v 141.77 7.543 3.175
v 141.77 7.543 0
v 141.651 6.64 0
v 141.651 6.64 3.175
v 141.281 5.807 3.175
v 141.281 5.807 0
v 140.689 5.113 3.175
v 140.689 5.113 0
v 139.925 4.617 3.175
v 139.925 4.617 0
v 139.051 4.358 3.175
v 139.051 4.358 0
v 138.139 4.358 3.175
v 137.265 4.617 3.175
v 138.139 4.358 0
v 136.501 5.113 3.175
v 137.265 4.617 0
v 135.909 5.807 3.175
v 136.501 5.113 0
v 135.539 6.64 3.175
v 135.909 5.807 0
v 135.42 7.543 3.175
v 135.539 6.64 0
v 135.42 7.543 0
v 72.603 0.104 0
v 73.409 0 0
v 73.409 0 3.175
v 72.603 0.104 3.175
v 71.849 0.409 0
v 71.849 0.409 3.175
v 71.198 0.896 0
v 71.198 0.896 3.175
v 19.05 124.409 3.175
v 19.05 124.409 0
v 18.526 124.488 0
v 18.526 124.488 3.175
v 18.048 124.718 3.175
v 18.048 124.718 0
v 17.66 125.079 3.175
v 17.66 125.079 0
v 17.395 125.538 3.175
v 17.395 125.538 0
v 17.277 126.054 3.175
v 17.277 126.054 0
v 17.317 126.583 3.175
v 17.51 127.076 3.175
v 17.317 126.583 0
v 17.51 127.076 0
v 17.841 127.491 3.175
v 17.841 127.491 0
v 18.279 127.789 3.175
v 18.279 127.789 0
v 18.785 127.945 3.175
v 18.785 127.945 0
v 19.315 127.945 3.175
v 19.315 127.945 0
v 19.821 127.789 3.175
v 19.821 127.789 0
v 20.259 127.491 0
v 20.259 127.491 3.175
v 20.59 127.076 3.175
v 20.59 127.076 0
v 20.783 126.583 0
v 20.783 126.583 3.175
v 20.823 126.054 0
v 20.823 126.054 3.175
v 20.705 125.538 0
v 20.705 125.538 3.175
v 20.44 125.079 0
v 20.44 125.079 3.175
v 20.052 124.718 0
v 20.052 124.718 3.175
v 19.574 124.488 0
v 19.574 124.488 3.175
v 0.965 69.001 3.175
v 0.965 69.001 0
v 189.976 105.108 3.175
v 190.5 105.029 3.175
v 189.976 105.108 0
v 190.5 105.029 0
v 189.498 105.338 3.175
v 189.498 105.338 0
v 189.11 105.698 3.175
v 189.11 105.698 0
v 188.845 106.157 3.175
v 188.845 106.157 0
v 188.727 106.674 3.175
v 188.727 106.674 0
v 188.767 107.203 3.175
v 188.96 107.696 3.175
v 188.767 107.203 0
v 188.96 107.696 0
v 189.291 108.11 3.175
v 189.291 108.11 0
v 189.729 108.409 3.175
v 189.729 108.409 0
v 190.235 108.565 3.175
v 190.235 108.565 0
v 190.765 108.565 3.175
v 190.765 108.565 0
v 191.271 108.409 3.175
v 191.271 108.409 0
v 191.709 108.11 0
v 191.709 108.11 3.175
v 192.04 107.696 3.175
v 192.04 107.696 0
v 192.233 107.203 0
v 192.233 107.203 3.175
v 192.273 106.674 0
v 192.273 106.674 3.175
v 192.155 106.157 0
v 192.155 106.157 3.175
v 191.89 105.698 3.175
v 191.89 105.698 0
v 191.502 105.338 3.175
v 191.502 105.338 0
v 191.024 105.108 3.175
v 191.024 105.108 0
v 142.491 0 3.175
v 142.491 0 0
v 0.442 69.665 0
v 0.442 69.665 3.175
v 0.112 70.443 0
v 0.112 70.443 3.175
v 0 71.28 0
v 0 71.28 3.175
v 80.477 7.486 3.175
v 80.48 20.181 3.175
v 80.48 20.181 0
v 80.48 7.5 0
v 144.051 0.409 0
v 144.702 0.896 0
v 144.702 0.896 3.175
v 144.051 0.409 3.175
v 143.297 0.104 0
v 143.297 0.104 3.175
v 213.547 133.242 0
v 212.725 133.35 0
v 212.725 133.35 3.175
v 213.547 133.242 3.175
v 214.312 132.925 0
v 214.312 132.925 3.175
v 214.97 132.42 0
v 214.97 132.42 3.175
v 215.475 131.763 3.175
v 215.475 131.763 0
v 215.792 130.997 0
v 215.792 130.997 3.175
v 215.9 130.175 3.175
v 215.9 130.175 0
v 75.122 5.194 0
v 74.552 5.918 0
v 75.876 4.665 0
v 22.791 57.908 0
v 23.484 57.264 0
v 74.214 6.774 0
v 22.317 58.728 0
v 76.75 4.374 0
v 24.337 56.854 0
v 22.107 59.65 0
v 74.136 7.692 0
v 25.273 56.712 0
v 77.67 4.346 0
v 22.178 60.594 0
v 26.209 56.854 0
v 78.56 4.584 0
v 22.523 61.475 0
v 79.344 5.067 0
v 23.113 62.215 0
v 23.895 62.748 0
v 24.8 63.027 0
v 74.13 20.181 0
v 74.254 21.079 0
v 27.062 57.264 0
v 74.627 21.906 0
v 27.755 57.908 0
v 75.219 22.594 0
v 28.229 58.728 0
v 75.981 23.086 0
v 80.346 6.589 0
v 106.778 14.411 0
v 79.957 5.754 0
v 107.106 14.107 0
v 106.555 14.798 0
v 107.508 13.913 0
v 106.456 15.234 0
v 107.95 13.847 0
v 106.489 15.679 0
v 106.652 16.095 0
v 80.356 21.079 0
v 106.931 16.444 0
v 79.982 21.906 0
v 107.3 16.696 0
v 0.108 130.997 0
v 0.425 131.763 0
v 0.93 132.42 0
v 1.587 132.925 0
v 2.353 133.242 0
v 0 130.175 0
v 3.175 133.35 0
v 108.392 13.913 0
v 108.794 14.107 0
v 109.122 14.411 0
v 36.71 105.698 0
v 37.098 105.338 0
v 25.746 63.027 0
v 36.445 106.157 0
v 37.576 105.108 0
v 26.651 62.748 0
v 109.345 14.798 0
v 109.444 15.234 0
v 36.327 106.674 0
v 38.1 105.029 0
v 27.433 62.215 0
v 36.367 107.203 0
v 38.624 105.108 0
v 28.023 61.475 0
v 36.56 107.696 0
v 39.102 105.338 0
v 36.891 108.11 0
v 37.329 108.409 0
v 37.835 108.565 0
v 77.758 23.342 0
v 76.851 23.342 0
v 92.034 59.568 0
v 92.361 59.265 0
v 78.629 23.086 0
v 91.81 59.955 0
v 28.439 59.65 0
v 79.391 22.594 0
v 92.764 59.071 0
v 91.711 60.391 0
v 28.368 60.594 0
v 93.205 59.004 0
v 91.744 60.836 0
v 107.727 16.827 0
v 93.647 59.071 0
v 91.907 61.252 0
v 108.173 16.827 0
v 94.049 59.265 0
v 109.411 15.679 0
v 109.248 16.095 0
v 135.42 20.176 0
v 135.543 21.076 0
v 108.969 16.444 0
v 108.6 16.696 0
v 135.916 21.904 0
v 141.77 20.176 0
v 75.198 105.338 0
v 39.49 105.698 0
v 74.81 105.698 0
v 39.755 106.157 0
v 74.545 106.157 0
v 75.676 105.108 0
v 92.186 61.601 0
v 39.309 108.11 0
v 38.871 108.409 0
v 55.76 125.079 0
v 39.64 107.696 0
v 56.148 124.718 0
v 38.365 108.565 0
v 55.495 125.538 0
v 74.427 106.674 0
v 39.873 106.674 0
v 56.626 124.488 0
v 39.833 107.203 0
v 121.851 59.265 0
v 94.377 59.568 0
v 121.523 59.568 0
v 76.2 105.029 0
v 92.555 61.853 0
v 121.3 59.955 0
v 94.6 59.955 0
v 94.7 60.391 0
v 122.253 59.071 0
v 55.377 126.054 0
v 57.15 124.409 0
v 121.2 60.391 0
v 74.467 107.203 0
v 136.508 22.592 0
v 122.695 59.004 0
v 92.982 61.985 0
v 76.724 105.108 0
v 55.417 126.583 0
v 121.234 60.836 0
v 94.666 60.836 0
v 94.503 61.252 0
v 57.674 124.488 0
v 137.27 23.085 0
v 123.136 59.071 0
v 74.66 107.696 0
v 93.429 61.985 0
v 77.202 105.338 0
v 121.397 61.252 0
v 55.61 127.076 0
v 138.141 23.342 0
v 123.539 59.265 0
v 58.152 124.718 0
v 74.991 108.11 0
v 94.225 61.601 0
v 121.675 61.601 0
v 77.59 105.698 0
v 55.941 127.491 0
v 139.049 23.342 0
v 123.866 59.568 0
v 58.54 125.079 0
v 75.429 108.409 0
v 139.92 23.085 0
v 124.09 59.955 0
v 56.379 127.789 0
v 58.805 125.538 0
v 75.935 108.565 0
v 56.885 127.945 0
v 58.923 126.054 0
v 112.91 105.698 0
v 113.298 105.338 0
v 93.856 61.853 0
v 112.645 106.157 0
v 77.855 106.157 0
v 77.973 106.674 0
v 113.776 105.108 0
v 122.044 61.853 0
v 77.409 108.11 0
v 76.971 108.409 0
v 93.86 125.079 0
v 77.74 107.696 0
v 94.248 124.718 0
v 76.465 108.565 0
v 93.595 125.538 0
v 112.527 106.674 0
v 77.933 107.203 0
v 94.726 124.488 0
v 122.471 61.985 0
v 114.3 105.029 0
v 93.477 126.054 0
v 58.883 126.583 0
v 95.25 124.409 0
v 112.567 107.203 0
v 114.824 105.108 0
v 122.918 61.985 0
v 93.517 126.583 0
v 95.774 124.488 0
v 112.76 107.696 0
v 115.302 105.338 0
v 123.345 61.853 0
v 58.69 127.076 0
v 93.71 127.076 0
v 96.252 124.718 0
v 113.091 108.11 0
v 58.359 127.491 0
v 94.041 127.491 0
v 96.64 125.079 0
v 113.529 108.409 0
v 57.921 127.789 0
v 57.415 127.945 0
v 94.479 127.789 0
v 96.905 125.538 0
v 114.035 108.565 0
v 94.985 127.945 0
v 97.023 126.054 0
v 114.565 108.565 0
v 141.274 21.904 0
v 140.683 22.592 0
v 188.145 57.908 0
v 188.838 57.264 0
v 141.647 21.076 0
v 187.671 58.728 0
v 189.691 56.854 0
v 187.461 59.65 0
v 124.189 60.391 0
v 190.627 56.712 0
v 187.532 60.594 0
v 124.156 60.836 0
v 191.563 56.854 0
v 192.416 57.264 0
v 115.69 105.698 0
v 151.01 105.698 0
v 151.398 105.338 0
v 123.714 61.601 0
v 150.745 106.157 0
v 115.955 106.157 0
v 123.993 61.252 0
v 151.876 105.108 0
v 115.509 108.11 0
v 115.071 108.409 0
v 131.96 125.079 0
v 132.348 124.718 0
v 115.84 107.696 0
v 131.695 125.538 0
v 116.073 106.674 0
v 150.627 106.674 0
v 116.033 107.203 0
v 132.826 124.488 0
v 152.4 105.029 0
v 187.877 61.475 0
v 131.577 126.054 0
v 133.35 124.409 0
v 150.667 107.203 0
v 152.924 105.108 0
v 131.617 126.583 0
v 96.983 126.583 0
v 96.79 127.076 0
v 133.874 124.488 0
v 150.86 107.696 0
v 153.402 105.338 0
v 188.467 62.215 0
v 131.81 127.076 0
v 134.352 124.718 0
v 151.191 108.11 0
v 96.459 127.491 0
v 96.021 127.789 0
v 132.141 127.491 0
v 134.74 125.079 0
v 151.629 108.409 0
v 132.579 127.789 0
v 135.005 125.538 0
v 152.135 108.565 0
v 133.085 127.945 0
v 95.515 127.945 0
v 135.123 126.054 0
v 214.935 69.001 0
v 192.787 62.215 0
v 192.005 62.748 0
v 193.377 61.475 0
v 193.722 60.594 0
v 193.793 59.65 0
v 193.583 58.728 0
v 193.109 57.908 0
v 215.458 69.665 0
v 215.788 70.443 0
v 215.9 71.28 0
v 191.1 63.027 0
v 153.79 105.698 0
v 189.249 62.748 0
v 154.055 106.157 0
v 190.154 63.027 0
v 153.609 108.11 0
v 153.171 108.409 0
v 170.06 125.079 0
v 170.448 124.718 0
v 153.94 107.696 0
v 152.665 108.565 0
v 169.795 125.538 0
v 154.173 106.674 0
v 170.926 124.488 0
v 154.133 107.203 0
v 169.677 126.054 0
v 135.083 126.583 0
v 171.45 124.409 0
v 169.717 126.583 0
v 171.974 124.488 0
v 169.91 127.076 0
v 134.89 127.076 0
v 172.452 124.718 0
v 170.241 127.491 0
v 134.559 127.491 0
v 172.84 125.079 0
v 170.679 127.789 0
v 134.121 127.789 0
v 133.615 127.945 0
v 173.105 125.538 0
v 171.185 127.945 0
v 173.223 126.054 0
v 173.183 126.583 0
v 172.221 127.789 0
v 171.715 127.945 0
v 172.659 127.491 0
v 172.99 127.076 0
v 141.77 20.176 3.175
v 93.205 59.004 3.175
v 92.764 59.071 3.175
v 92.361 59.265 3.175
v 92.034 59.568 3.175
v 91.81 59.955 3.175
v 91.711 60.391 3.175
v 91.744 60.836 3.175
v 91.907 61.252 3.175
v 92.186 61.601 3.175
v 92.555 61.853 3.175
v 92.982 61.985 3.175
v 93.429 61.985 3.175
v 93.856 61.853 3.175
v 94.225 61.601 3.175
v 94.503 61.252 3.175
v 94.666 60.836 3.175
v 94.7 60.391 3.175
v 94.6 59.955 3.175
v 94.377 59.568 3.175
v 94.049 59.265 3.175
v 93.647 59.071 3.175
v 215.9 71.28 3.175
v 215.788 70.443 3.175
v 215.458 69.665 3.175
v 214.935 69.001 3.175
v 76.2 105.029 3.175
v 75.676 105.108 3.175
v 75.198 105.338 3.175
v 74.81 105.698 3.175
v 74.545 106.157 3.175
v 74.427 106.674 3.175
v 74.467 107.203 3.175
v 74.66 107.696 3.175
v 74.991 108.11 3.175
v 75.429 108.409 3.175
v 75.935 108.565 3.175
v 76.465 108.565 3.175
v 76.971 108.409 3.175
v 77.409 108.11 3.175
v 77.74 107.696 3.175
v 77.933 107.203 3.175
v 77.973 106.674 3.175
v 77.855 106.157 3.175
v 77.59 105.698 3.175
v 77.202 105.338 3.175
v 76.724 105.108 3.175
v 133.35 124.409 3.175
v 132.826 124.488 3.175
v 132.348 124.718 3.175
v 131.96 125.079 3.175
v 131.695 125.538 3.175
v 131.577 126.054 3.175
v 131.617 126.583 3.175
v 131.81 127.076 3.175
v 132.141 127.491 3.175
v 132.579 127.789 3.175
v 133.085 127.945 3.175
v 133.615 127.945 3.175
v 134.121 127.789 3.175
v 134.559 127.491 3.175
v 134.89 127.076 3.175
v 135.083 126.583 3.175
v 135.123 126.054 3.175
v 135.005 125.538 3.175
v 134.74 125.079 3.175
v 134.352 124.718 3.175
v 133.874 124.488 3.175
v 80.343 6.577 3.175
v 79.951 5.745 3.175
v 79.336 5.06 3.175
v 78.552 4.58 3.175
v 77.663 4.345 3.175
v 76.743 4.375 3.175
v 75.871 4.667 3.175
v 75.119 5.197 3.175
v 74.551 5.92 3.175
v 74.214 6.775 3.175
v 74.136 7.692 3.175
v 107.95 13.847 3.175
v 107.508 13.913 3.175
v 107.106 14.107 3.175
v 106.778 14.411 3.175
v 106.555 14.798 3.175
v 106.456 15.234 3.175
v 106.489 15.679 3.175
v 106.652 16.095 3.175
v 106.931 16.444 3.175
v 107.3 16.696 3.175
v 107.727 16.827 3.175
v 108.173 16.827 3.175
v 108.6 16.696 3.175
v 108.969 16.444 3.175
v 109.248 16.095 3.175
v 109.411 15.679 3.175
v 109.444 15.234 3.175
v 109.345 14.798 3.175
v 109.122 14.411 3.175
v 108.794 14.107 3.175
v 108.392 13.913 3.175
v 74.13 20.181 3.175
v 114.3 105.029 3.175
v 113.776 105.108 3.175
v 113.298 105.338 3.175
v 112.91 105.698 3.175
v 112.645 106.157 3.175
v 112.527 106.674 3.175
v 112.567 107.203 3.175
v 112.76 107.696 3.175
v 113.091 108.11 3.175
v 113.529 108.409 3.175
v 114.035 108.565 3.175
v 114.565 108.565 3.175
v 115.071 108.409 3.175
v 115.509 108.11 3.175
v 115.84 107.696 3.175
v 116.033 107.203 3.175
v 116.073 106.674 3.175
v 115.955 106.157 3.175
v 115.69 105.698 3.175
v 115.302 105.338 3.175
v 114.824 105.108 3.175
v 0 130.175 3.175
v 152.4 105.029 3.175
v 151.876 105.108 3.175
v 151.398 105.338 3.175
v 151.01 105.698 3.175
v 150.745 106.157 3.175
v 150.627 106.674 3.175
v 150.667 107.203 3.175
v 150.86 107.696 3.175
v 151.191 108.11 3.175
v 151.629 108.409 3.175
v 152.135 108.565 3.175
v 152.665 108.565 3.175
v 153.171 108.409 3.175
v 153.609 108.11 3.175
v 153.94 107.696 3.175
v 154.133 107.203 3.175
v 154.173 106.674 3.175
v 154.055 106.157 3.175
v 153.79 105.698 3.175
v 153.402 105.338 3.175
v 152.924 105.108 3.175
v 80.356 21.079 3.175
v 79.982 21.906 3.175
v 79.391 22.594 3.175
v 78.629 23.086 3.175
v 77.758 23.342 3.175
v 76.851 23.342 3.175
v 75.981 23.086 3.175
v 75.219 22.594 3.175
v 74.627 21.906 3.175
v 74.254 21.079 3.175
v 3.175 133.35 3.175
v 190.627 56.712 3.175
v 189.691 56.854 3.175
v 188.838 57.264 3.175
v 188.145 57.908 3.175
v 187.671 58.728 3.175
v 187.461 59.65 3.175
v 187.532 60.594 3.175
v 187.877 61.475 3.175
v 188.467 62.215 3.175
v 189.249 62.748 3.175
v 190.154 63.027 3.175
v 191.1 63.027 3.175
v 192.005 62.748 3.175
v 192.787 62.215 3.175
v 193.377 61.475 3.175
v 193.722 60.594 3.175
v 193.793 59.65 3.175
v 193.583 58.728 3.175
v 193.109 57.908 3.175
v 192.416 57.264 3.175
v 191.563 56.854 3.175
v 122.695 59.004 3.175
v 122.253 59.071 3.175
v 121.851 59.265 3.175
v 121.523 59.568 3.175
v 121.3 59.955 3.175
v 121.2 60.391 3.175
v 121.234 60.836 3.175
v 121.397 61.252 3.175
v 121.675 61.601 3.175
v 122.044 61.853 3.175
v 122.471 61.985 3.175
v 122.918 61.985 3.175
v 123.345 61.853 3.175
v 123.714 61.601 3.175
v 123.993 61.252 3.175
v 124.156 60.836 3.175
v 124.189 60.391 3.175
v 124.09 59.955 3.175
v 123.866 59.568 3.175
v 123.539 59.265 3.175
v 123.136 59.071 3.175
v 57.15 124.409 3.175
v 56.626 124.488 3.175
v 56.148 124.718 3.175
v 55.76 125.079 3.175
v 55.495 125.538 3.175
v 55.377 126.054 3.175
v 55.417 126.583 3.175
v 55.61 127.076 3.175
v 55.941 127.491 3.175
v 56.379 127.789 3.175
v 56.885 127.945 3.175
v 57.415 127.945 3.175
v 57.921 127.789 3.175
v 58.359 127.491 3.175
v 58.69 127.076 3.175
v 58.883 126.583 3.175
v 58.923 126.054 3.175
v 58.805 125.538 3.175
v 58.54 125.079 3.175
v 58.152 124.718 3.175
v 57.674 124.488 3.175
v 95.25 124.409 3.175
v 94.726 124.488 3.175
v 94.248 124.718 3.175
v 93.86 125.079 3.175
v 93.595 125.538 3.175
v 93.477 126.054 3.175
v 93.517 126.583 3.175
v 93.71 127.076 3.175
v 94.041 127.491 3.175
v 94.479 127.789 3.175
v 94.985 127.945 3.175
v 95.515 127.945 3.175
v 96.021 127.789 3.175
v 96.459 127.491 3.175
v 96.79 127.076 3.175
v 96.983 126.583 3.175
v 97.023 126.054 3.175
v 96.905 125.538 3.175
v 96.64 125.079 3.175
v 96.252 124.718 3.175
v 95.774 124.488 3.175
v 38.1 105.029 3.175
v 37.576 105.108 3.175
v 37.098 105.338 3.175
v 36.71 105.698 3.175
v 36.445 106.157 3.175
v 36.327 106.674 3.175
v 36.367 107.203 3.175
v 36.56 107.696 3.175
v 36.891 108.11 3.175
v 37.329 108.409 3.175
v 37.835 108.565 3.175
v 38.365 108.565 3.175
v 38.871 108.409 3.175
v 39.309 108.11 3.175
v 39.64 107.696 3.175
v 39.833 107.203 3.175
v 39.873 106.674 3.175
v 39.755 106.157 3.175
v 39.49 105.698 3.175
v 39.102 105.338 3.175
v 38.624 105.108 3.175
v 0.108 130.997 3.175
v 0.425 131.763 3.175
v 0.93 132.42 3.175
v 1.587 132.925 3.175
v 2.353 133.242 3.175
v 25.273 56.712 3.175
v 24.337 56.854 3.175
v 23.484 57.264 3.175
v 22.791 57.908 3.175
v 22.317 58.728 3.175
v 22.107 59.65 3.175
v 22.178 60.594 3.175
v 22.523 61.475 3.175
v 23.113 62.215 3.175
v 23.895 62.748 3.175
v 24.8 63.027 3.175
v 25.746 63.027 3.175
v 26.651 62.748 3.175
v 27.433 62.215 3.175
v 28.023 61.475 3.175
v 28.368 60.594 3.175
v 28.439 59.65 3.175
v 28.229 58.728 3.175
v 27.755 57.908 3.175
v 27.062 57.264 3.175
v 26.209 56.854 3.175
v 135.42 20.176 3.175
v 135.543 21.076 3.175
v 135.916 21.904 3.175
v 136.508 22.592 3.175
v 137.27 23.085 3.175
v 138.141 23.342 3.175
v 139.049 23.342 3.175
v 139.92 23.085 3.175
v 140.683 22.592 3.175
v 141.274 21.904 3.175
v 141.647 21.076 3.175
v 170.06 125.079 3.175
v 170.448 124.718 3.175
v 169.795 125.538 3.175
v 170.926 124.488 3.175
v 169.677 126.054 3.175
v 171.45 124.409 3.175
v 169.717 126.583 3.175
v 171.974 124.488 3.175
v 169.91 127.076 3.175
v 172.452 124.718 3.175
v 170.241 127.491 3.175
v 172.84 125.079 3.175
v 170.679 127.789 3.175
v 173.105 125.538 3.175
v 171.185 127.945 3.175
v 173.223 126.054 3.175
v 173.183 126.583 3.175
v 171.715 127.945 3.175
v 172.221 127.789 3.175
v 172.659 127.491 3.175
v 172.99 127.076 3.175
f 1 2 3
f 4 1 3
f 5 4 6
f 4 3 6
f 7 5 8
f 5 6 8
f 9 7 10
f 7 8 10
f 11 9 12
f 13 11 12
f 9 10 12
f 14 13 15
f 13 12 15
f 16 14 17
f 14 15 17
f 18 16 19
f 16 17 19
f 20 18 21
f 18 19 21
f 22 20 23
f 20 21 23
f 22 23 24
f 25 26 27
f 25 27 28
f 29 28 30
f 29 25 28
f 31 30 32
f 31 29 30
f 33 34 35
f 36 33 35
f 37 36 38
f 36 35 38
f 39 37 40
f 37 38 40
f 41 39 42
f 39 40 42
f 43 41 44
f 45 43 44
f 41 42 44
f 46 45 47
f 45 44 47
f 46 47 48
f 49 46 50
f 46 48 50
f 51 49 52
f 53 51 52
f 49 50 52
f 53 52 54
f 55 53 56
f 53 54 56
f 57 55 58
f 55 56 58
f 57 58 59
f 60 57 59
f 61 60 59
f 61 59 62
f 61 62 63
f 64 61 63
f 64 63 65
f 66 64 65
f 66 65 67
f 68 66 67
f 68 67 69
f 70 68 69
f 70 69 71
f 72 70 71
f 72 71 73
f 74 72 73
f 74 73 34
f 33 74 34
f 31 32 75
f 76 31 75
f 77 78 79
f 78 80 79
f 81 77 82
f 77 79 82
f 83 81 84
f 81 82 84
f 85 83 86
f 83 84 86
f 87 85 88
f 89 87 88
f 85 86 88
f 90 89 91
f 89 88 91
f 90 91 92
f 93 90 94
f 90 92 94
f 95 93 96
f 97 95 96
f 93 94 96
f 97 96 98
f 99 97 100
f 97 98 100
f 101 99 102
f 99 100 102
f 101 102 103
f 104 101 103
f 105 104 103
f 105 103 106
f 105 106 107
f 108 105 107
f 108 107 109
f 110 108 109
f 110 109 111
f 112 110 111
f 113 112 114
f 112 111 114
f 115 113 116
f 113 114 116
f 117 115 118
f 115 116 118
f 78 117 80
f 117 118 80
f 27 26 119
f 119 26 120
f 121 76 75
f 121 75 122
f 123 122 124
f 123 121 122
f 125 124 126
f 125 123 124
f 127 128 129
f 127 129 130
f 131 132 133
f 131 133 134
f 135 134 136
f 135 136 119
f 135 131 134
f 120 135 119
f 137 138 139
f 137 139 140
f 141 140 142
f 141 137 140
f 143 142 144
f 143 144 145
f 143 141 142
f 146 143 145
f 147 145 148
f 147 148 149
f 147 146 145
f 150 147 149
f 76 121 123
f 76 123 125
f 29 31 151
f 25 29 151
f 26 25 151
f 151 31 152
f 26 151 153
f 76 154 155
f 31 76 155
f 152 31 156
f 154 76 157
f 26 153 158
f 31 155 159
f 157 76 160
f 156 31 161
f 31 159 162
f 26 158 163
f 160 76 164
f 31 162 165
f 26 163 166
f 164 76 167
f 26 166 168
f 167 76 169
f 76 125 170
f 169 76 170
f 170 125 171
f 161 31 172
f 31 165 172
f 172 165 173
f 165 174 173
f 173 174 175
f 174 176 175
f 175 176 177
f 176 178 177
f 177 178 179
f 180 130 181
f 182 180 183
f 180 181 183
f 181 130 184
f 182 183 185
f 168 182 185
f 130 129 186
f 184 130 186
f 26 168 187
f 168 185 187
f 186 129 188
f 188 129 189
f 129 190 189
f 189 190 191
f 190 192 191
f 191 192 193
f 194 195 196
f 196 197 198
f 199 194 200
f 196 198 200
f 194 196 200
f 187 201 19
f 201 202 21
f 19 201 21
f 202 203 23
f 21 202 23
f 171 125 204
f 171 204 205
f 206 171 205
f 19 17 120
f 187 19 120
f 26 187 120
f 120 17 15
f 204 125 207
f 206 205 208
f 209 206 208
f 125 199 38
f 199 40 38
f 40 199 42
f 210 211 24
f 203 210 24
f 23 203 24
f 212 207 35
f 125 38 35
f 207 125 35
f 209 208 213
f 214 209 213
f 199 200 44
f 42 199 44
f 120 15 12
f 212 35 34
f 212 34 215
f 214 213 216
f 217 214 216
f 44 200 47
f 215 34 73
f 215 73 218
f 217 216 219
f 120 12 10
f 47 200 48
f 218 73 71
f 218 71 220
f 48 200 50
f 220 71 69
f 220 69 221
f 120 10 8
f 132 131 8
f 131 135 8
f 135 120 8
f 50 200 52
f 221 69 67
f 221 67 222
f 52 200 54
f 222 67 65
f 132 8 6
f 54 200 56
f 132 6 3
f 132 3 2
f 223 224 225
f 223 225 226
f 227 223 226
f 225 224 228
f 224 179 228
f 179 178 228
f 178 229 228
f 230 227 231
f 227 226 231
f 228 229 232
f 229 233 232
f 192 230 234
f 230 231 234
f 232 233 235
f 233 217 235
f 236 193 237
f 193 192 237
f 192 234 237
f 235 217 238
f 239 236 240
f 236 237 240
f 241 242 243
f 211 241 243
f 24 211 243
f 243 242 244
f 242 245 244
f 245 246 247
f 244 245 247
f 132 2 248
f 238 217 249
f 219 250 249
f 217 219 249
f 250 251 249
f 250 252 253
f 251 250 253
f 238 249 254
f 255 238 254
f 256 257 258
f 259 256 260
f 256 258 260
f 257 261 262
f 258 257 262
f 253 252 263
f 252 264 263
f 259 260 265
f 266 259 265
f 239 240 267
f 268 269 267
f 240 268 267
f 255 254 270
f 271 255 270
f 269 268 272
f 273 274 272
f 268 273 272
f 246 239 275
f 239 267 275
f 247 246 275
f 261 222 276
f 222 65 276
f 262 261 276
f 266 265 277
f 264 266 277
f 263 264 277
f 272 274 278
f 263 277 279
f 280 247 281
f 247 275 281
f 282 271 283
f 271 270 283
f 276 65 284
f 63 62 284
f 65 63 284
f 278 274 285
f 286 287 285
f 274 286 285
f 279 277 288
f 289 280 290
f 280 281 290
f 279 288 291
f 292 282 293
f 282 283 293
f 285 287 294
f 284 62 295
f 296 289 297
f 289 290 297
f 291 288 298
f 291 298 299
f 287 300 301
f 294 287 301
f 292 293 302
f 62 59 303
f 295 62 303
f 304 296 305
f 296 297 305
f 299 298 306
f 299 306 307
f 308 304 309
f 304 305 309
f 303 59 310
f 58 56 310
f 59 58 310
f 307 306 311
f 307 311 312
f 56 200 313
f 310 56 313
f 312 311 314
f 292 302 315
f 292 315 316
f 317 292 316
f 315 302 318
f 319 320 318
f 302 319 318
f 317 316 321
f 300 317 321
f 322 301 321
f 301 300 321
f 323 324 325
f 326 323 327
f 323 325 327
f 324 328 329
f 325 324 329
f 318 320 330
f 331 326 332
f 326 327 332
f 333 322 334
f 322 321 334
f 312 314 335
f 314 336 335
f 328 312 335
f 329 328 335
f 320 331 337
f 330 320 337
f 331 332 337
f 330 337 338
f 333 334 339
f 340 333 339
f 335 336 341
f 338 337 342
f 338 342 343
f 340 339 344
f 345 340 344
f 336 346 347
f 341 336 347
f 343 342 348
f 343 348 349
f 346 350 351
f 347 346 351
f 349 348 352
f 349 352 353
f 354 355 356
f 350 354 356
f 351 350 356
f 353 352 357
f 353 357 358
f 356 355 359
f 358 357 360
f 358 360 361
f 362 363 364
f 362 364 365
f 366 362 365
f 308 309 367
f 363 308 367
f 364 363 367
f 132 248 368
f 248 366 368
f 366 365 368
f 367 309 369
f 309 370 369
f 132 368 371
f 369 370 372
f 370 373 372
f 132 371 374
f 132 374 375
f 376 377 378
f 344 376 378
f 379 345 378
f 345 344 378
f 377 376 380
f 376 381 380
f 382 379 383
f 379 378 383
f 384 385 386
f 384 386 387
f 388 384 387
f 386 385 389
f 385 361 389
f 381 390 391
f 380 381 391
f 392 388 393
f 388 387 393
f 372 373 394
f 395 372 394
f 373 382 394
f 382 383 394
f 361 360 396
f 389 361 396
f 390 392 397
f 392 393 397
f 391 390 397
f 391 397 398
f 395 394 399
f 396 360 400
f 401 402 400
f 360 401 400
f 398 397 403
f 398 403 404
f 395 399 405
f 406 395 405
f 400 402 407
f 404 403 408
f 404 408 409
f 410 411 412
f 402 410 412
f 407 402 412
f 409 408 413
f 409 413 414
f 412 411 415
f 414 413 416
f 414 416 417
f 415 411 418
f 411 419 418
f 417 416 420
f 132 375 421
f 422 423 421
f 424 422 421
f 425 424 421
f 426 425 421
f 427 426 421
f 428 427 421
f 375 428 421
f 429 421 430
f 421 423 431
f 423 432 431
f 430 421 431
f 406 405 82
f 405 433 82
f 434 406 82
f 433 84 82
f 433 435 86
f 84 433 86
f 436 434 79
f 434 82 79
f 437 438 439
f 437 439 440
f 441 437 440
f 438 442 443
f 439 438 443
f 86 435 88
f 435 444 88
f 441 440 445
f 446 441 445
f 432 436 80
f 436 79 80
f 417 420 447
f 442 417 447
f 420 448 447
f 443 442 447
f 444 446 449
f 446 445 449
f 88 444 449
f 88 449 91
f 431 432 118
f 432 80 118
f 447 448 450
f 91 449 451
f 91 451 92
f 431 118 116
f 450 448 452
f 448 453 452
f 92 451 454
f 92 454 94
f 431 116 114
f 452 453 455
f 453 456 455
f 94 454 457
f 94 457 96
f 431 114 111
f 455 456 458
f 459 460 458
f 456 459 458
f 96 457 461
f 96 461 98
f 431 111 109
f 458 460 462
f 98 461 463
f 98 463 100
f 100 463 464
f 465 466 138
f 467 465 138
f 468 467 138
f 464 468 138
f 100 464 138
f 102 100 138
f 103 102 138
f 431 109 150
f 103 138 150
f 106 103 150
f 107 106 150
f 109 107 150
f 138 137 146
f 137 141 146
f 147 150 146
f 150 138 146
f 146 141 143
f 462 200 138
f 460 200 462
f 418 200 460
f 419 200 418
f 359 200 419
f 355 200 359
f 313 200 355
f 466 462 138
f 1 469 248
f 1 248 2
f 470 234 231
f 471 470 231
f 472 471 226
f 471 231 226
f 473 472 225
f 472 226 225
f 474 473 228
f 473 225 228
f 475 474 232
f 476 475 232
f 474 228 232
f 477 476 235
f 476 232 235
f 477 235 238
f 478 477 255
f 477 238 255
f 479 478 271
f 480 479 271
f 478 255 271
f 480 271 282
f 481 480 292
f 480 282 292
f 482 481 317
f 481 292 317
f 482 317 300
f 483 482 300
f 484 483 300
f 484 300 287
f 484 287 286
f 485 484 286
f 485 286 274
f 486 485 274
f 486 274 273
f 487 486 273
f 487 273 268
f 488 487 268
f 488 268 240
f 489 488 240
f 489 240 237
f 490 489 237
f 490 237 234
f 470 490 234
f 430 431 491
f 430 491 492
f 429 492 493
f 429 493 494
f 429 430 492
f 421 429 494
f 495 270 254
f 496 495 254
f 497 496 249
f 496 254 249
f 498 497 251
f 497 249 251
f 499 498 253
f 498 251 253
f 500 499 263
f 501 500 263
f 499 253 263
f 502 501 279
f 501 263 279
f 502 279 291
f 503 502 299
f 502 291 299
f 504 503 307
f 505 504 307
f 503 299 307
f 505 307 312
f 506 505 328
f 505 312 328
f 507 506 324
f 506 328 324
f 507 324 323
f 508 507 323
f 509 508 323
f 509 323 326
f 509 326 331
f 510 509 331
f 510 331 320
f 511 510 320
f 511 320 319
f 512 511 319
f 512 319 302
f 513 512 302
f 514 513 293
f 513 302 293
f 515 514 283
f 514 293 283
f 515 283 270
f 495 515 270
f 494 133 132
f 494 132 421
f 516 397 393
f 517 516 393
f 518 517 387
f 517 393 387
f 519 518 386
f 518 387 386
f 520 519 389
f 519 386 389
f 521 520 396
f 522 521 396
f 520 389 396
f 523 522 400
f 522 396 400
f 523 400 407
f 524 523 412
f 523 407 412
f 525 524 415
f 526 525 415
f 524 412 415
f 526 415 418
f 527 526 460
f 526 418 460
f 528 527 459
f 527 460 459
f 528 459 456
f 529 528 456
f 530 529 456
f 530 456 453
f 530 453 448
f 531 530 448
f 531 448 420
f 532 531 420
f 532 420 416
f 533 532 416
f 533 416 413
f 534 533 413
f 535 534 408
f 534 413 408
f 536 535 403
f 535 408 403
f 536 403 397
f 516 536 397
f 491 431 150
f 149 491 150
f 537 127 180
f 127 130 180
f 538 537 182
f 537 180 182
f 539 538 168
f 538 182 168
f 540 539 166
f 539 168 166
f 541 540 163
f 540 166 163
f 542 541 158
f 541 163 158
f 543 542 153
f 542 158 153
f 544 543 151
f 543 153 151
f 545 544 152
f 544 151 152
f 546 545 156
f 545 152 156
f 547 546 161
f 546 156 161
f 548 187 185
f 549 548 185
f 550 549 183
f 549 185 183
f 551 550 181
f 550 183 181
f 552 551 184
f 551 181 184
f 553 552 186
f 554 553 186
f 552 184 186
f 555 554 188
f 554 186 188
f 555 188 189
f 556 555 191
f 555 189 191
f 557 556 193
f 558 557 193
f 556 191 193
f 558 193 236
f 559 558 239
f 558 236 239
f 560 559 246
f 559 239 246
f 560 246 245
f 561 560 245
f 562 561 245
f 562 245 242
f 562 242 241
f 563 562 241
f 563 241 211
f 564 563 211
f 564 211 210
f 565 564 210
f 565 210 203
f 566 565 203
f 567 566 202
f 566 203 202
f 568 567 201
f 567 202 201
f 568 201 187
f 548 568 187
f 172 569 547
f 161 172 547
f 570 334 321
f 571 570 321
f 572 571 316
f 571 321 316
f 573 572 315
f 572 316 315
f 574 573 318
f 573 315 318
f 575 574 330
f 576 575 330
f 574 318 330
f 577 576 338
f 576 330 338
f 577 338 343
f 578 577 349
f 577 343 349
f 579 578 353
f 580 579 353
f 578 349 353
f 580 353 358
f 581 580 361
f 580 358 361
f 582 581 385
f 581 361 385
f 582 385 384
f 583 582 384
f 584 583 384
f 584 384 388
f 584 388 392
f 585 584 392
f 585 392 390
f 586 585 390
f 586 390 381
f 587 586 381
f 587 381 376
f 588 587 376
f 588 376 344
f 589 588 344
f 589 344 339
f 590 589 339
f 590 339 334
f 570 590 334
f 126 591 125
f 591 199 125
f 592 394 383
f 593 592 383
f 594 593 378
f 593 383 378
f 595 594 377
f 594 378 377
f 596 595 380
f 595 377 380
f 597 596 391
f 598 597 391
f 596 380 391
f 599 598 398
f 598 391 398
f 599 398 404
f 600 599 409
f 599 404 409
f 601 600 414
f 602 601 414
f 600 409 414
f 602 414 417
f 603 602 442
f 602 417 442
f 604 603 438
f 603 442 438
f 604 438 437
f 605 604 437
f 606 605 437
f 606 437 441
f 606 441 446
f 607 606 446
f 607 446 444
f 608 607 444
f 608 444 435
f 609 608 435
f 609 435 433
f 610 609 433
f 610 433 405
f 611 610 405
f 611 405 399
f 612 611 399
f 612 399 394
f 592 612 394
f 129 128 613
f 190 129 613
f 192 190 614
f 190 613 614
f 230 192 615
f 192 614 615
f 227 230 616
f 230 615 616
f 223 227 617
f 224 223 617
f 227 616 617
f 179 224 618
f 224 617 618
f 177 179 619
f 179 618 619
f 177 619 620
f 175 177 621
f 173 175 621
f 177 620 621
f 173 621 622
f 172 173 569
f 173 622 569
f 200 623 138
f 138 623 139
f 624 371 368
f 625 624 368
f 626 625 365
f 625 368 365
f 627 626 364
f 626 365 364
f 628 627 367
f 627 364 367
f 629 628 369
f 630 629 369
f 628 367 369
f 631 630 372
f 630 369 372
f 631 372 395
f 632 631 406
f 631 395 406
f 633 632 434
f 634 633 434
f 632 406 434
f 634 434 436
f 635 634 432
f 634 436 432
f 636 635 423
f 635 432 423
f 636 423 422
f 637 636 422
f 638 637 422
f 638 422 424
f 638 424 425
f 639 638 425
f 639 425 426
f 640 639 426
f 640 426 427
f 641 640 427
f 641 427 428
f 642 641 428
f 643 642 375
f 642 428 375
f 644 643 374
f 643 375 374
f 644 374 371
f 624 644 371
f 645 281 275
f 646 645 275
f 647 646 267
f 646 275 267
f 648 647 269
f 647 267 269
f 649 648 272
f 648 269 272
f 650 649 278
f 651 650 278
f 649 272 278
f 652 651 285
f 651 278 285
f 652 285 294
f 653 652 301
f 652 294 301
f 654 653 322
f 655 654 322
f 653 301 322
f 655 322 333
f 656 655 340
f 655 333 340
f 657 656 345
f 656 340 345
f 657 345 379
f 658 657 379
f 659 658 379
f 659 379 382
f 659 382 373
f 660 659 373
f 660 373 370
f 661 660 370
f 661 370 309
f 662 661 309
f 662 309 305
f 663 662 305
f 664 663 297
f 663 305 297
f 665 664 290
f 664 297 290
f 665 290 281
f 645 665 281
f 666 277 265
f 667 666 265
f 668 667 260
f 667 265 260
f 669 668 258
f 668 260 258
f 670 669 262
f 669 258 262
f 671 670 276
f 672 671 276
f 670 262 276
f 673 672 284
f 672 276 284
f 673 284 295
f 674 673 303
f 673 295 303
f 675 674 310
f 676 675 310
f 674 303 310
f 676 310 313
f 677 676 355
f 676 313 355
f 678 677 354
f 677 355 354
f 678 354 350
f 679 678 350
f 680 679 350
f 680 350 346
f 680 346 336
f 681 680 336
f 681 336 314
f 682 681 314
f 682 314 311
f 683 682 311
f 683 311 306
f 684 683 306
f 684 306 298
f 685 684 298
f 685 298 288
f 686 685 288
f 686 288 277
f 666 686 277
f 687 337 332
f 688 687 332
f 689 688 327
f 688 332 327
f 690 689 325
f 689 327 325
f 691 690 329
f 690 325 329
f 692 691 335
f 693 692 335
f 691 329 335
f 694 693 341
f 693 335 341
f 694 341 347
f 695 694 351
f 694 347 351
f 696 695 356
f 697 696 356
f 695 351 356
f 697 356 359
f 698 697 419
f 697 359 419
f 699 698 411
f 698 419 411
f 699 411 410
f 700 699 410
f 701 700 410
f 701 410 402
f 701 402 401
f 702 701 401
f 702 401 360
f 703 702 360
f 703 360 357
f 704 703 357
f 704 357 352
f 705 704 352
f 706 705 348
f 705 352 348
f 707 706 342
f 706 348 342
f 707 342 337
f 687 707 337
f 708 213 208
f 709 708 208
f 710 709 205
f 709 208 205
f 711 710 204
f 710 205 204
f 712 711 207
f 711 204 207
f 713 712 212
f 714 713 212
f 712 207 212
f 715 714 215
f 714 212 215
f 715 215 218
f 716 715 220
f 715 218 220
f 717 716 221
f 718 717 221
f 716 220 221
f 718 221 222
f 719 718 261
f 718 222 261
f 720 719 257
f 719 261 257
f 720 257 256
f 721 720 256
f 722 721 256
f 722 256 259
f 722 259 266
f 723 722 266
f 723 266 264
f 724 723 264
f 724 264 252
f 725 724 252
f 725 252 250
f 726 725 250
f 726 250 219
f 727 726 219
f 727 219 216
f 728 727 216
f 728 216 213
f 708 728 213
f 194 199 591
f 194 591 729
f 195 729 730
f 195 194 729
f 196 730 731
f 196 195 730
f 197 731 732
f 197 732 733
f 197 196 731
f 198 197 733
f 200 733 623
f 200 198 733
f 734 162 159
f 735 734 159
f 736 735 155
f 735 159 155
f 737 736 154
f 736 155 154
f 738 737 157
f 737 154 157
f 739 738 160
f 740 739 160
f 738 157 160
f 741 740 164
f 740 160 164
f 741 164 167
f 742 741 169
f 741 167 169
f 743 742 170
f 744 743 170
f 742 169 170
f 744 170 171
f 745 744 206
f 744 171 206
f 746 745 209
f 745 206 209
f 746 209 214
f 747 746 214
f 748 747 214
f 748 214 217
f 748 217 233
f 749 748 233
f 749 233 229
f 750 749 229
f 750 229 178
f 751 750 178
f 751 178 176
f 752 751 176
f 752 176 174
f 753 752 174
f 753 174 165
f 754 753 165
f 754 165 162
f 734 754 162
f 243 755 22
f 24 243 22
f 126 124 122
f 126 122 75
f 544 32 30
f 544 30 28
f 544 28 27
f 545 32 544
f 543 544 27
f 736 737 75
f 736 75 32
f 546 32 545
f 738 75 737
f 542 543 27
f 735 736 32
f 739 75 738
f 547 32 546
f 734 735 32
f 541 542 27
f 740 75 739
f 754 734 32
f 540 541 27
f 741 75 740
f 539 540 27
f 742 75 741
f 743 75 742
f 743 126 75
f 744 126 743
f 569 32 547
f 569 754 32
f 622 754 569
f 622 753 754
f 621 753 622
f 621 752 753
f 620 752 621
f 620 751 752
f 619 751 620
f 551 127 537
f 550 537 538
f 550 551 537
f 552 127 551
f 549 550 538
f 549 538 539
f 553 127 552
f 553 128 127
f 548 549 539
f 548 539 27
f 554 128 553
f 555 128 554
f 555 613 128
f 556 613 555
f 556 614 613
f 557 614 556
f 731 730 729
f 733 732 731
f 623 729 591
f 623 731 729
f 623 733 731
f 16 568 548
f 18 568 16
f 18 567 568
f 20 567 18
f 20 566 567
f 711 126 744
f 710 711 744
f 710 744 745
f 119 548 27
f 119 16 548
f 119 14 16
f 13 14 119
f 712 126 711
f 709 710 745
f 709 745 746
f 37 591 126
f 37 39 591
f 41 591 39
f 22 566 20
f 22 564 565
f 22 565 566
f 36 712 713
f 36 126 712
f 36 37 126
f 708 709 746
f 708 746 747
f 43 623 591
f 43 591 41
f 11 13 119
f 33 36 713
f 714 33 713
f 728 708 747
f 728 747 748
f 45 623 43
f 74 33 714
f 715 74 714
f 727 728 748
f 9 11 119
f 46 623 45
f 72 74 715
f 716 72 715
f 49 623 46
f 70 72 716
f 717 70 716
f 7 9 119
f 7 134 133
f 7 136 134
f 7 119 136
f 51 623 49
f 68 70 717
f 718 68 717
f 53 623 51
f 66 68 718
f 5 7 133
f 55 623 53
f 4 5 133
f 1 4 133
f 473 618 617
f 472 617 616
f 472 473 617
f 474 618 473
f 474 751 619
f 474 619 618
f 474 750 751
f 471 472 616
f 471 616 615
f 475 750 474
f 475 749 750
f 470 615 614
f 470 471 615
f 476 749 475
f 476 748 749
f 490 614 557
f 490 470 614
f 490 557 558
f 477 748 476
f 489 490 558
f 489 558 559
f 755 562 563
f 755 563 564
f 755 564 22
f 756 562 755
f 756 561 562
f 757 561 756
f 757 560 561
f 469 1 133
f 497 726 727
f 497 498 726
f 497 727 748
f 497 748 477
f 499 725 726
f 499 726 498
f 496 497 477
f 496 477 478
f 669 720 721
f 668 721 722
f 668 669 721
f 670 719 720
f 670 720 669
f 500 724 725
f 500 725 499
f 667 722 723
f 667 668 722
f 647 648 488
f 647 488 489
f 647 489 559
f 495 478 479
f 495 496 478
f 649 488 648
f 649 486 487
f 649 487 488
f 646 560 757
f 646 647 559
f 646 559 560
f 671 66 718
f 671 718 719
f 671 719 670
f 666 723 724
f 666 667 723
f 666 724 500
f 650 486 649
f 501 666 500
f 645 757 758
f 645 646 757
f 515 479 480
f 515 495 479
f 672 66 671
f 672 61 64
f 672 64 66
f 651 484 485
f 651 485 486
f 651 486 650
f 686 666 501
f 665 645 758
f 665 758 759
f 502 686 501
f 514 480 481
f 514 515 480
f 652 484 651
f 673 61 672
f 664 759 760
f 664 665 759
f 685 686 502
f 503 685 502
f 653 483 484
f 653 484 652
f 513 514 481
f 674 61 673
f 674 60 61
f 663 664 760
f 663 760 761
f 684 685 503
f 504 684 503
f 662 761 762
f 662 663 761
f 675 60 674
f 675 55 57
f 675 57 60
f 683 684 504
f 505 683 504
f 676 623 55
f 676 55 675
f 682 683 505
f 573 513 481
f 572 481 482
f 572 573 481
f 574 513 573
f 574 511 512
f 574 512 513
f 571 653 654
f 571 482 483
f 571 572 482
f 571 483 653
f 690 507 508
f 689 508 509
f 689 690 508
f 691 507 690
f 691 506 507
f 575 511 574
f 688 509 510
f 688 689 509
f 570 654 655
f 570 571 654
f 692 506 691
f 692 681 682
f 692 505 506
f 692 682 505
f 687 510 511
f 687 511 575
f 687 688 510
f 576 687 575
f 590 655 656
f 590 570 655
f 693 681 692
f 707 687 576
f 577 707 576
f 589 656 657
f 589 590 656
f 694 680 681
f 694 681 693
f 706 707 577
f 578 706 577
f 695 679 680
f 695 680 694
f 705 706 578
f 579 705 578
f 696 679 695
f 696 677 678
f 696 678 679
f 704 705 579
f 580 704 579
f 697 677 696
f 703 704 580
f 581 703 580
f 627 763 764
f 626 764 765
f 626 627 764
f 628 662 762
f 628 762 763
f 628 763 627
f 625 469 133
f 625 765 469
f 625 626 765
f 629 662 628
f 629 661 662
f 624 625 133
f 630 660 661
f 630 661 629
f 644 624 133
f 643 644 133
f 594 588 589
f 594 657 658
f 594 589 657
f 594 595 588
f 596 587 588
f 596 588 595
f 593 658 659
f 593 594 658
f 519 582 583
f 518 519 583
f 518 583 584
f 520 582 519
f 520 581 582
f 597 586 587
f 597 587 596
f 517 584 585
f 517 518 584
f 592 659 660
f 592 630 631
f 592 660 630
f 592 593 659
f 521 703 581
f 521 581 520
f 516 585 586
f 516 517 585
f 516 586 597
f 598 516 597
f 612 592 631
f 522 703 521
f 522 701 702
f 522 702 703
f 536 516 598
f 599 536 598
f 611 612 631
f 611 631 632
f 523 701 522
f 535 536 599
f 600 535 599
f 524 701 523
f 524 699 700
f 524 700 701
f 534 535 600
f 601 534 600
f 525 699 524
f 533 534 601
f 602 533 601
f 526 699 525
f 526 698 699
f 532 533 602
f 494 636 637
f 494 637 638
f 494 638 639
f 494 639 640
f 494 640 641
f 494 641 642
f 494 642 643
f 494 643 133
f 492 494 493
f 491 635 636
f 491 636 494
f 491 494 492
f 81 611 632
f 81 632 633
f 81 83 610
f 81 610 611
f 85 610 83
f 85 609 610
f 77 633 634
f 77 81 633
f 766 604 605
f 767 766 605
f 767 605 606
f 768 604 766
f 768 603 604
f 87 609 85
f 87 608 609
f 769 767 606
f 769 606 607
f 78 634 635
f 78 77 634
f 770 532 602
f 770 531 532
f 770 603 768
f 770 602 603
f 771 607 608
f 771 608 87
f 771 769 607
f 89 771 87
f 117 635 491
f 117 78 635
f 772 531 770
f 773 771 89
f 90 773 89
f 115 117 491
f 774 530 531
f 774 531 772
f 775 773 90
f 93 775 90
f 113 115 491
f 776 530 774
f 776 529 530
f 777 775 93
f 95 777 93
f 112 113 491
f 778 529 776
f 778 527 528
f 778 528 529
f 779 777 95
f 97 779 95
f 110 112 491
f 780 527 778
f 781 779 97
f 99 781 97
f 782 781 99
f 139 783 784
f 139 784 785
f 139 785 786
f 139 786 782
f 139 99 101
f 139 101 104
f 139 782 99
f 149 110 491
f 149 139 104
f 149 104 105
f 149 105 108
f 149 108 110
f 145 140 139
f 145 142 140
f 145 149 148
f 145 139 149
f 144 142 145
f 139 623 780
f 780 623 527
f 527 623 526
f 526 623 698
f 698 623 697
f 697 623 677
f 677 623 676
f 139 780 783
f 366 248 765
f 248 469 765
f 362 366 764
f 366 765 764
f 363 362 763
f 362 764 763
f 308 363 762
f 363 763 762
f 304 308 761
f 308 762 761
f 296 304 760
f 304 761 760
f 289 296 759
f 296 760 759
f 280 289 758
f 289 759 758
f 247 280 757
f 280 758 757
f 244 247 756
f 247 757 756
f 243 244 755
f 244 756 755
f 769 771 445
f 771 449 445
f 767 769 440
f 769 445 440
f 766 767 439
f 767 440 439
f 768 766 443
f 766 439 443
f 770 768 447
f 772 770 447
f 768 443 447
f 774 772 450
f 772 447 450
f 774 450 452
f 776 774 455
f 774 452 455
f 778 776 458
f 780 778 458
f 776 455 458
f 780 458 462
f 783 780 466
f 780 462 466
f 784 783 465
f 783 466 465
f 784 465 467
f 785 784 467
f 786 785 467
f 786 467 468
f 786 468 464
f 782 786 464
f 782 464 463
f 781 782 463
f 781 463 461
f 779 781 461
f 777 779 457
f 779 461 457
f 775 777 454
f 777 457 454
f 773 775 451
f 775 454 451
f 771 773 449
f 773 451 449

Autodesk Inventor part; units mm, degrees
ref_plane "YZ Plane" through (0, 0, 0) normal (1, 0, 0) x (0, 1, 0)
ref_plane "XZ Plane" through (0, 0, 0) normal (0, 1, 0) x (-1, 0, 0)
ref_plane "XY Plane" through (0, 0, 0) normal (0, 0, 1) x (1, 0, 0)
sketch "Sketch1" plane through (0, 0, 0) normal (0, 0, 1) x (1, 0, 0)
  line L0 (0, 0) -> (215.9, 0)
  line L1 (215.9, 0) -> (215.9, 152.4)
  line L2 (215.9, 152.4) -> (0, 152.4)
  line L3 (0, 152.4) -> (0, 0)
  dimension "d0" = 215.9
  dimension "d1" = 152.4
extrude "Extrusion1" add sketch "Sketch1" along normal blind 3.175
sketch "Sketch2" plane through (0, 0, 3.175) normal (0, 0, 1) x (1, 0, 0)
  line L0 (215.9, 152.4) -> (0, 152.4) construction
  line L1 (107.95, 152.4) -> (107.95, 0) construction
  line L2 (0, 0) -> (215.9, 0) projected
  point P0 (25.273, 59.8875)
  point P1 (77.3049, 7.5)
  point P2 (190.627, 59.8875)
  point P3 (138.5951, 7.5)
  dimension "d5" = 30.6451
  dimension "d7" = 82.677
  dimension "d9" = 52.3875
  dimension "d10" = 7.5
hole "Hole1" at (25.273, 59.8875, 3.175) at (77.3049, 7.5, 3.175) at (190.627, 59.8875, 3.175) at (138.5951, 7.5, 3.175) direction (0, 0, -1) diameter 6.35 end through all
sketch "Sketch3" plane through (0, 0, 3.175) normal (0, 0, 1) x (1, 0, 0)
  line L0 (215.9, 152.4) -> (0, 152.4) projected
  line L1 (107.95, 152.4) -> (107.95, 0)
  line L2 (0, 0) -> (215.9, 0) projected
  line L3 (21.4376, 59.8875) -> (76.2, 7.5) construction
  line L4 (0, 152.4) -> (0, 0) projected
  line L5 (0, 130.175) -> (0, 78.2462)
  line L6 (3.175, 133.35) -> (107.95, 133.35)
  line L7 (0, 133.35) -> (0, 125.3708)
  line L8 (194.4624, 59.8875) -> (139.7, 7.5) construction
  line L9 (215.9, 152.4) -> (215.9, 78.2462)
  line L10 (215.9, 133.35) -> (215.9, 76.9596)
  line L11 (212.725, 133.35) -> (107.95, 133.35)
  line L12 (215.9, 130.175) -> (215.9, 125.3708)
  line L13 (75.9713, 0) -> (107.95, 0)
  line L14 (139.9287, 0) -> (107.95, 0)
  line L15 (215.9, 0) -> (215.9, 152.4) projected
  line L16 (107.95, 56.0437) -> (190.627, 56.0437) construction
  line L17 (0, 0) -> (215.9, 0) projected
  line L18 (143.7779, 0) -> (215.9, 69.9366)
  line L19 (72.1221, 0) -> (0, 69.9366)
  line L20 (0, 152.4) -> (0, 0) projected
  line L21 (72.1221, 0) -> (107.95, 0)
  line L22 (3.175, 133.35) -> (0, 133.35)
  line L23 (212.725, 133.35) -> (215.9, 133.35)
  point P0 (74.6275, 0)
  point P1 (0, 76.9596)
  point P2 (77.9849, 0)
  dimension "d20" = 19.05
  dimension "d36" = 135.881
  dimension "d37" = 135.881
  dimension "d41" = 35.8279
sketch "Sketch4" plane through (0, 0, 3.175) normal (0, 0, 1) x (1, 0, 0)
  arc A0 (80.4798, 20.1806) -> (74.13, 20.1806) centre (77.3049, 20.2) ccw
  circle A1 centre (77.3049, 7.5) radius 3.175 projected
  circle A2 centre (77.3049, 7.5) radius 3.175 projected
  line L0 (3.175, 133.35) -> (212.725, 133.35) projected
  line L1 (107.95, 133.35) -> (107.95, 0) construction
  line L2 (0, 0) -> (215.9, 0) projected
  arc A3 (141.77, 20.176) -> (135.4202, 20.176) centre (138.5951, 20.2) ccw
  arc A4 (74.1357, 7.5165) -> (80.474, 7.4806) centre (77.3049, 7.5) ccw
  circle A5 centre (138.5951, 7.5) radius 3.175 projected
  arc A6 (135.4202, 7.5433) -> (141.77, 7.5433) centre (138.5951, 7.5) ccw
  line L3 (141.77, 20.176) -> (141.77, 7.476)
  circle A7 centre (138.5951, 7.5) radius 3.175 projected
  line L4 (141.77, 20.176) -> (154.47, 20.176) construction
  line L5 (135.4202, 20.176) -> (135.4202, 7.476)
  line L6 (135.4202, 20.176) -> (148.1202, 20.176) construction
  line L7 (80.4798, 20.1806) -> (80.4798, 7.4806)
  line L8 (80.4798, 20.1806) -> (93.1798, 20.1806) construction
  line L9 (74.13, 20.1806) -> (74.1358, 7.4806)
  line L10 (74.13, 20.1806) -> (86.83, 20.1806) construction
  line L11 (74.13, 20.1806) -> (80.4798, 20.1806)
  line L12 (74.1358, 7.4806) -> (80.4798, 7.4806)
  line L13 (135.4202, 7.476) -> (141.77, 7.476)
  line L14 (135.4202, 20.176) -> (141.77, 20.176)
  line L15 (107.95, 0) -> (107.95, 152.4)
  line L16 (215.9, 152.4) -> (0, 152.4) projected
  line L17 (138.5951, 7.5) -> (107.95, 7.5)
  line L18 (138.5951, 20.2) -> (107.95, 20.2)
  line L19 (138.5951, 20.2) -> (169.2402, 20.2) construction
  point P0 (75.9713, 0)
  point P1 (139.9287, 0)
  point P2 (136.525, 7.4971)
  dimension "d29" = 6.35
  dimension "d30" = 12.7
  dimension "d44" = 90
  dimension "d45" = 90
  dimension "d46" = 90
  dimension "d48" = 12.7
  dimension "d49" = 12.7
  dimension "d50" = 12.7
  dimension "d117" = 180
extrude "Extrusion3" cut sketch "Sketch3" against normal blind 25.4 contours L9 L23 L11 L1 L0 | L1 L6 L22 L4 L0 | L2 L4 L19 | L18 L15 L2
extrude "Extrusion5" cut sketch "Sketch4" against normal blind 25.4 contours L11 A0 | L7 A1 L9 L11 | A1 L12 A4 L9 | L9 A4 L12 A1 | A4 L12 | L14 A3 | L3 A5 L5 L14 | A5 L13 | A5 L13
fillet "Fillet1" radius 3.175 6 edges at (0, 69.9366, 1.5875) (0, 133.35, 1.5875) (215.9, 133.35, 1.5875) (215.9, 69.9366, 1.5875) (143.7779, 0, 1.5875) (72.1221, 0, 1.5875)
sketch "Sketch5" plane through (0, 0, 3.175) normal (0, 0, 1) x (1, 0, 0)
  line L0 (73.4087, 0) -> (142.4913, 0) projected
  line L1 (73.4087, 0) -> (142.4913, 0)
  line L2 (107.95, 0) -> (107.95, 133.35)
  line L3 (212.725, 133.35) -> (3.175, 133.35) projected
  line L4 (107.95, 0) -> (241.3, 0) construction
  line L5 (107.95, 0) -> (107.95, 30.691)
  line L6 (122.6947, 0) -> (122.6947, 60.5028)
  line L7 (122.6947, 0) -> (183.1975, 0) construction
  circle A0 centre (107.95, 15.3455) radius 1.4986
  point P0 (0, 0)
  point P1 (93.2053, 60.5028)
  dimension "d56" = 90
  dimension "d58" = 90
  dimension "d59" = 60.5028
  dimension "d60" = 2.9972
  dimension "d61" = 14.7447
  dimension "d62" = 14.7447
  dimension "d63" = 60.5028
hole "Hole2" at (107.95, 15.3455, 3.175) at (93.2053, 60.5028, 3.175) at (122.6947, 60.5028, 3.175) at (107.95, 15.3455, 3.175) at (122.6947, 60.5028, 3.175) direction (0, 0, -1) diameter 2.9972 end through all
sketch "Sketch7" plane through (0, 0, 3.175) normal (0, 0, 1) x (1, 0, 0)
  line L0 (212.725, 133.35) -> (3.175, 133.35) projected
  line L1 (0, 130.175) -> (0, 71.2804) projected
  point P0 (0, 0)
  point P1 (19.05, 126.1872)
  point P2 (38.1, 106.807)
  point P3 (57.15, 126.1872)
  point P4 (76.2, 106.807)
  point P5 (95.25, 126.1872)
  point P6 (114.3, 106.807)
  point P7 (133.35, 126.1872)
  point P8 (152.4, 106.807)
  point P9 (171.45, 126.1872)
  point P10 (190.5, 106.807)
  dimension "d83" = 7.1628
  dimension "d84" = 19.05
  dimension "d85" = 7.1628
  dimension "d89" = 26.543
  dimension "d90" = 26.543
  dimension "d94" = 38.1
  dimension "d95" = 57.15
  dimension "d96" = 76.2
  dimension "d97" = 7.1628
  dimension "d98" = 95.25
  dimension "d99" = 26.543
  dimension "d100" = 114.3
  dimension "d102" = 7.1628
  dimension "d103" = 133.35
  dimension "d104" = 26.543
  dimension "d105" = 152.4
  dimension "d106" = 7.1628
  dimension "d107" = 171.45
  dimension "d108" = 26.543
  dimension "d109" = 190.5
hole "Hole4" at (19.05, 126.1872, 3.175) at (38.1, 106.807, 3.175) at (57.15, 126.1872, 3.175) at (76.2, 106.807, 3.175) at (95.25, 126.1872, 3.175) at (114.3, 106.807, 3.175) at (133.35, 126.1872, 3.175) at (152.4, 106.807, 3.175) at (171.45, 126.1872, 3.175) at (190.5, 106.807, 3.175) direction (0, 0, -1) diameter 3.556 end through all
equation "\"d37\" = d36"
equation "\"d48\" = d30"
equation "\"d49\" = d50"
equation "\"d62\" = d61"
equation "\"d63\" = d59"
equation "\"d85\" = d83"
equation "\"d90\" = d89"
equation "\"d97\" = d83"
equation "\"d99\" = d89"
equation "\"d102\" = d83"
equation "\"d104\" = d89"
equation "\"d106\" = d83"
equation "\"d108\" = d89"
properties part number "new pulley plate"
